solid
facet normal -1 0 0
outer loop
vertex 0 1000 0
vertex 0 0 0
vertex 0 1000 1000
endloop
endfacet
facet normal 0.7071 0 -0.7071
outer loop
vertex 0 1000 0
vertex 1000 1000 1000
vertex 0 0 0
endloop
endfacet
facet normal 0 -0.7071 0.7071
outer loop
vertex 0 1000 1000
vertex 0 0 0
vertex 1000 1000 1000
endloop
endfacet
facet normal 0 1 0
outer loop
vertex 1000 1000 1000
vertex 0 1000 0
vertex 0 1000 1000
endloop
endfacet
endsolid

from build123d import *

# Parameters (mm, degrees)
F0_W     = 1000
F0_H     = 1000
F1_DEPTH = 1000
F4_DEPTH = 1000.001
F5_DEPTH = 1000.001


with BuildPart() as f1:
    # F0 (on Top) → F1 (new body)
    with BuildSketch(Plane.XY):
        with Locations((500, 500)):
            Rectangle(F0_W, F0_H)
    extrude(amount=F1_DEPTH)

    # F2 (on face) → F4 (cut, through all)
    with BuildSketch(Plane.YZ.offset(1000)):
        Polygon((0, 0), (1000, 1000), (0, 1000), align=None)
    extrude(amount=-F4_DEPTH, mode=Mode.SUBTRACT)

    # F3 (on face) → F5 (cut, through all)
    with BuildSketch(Plane.XZ):
        Polygon((1000, 0), (1000, 1000), (0, 0), align=None)
    extrude(amount=-F5_DEPTH, mode=Mode.SUBTRACT)


solid = f1.part
